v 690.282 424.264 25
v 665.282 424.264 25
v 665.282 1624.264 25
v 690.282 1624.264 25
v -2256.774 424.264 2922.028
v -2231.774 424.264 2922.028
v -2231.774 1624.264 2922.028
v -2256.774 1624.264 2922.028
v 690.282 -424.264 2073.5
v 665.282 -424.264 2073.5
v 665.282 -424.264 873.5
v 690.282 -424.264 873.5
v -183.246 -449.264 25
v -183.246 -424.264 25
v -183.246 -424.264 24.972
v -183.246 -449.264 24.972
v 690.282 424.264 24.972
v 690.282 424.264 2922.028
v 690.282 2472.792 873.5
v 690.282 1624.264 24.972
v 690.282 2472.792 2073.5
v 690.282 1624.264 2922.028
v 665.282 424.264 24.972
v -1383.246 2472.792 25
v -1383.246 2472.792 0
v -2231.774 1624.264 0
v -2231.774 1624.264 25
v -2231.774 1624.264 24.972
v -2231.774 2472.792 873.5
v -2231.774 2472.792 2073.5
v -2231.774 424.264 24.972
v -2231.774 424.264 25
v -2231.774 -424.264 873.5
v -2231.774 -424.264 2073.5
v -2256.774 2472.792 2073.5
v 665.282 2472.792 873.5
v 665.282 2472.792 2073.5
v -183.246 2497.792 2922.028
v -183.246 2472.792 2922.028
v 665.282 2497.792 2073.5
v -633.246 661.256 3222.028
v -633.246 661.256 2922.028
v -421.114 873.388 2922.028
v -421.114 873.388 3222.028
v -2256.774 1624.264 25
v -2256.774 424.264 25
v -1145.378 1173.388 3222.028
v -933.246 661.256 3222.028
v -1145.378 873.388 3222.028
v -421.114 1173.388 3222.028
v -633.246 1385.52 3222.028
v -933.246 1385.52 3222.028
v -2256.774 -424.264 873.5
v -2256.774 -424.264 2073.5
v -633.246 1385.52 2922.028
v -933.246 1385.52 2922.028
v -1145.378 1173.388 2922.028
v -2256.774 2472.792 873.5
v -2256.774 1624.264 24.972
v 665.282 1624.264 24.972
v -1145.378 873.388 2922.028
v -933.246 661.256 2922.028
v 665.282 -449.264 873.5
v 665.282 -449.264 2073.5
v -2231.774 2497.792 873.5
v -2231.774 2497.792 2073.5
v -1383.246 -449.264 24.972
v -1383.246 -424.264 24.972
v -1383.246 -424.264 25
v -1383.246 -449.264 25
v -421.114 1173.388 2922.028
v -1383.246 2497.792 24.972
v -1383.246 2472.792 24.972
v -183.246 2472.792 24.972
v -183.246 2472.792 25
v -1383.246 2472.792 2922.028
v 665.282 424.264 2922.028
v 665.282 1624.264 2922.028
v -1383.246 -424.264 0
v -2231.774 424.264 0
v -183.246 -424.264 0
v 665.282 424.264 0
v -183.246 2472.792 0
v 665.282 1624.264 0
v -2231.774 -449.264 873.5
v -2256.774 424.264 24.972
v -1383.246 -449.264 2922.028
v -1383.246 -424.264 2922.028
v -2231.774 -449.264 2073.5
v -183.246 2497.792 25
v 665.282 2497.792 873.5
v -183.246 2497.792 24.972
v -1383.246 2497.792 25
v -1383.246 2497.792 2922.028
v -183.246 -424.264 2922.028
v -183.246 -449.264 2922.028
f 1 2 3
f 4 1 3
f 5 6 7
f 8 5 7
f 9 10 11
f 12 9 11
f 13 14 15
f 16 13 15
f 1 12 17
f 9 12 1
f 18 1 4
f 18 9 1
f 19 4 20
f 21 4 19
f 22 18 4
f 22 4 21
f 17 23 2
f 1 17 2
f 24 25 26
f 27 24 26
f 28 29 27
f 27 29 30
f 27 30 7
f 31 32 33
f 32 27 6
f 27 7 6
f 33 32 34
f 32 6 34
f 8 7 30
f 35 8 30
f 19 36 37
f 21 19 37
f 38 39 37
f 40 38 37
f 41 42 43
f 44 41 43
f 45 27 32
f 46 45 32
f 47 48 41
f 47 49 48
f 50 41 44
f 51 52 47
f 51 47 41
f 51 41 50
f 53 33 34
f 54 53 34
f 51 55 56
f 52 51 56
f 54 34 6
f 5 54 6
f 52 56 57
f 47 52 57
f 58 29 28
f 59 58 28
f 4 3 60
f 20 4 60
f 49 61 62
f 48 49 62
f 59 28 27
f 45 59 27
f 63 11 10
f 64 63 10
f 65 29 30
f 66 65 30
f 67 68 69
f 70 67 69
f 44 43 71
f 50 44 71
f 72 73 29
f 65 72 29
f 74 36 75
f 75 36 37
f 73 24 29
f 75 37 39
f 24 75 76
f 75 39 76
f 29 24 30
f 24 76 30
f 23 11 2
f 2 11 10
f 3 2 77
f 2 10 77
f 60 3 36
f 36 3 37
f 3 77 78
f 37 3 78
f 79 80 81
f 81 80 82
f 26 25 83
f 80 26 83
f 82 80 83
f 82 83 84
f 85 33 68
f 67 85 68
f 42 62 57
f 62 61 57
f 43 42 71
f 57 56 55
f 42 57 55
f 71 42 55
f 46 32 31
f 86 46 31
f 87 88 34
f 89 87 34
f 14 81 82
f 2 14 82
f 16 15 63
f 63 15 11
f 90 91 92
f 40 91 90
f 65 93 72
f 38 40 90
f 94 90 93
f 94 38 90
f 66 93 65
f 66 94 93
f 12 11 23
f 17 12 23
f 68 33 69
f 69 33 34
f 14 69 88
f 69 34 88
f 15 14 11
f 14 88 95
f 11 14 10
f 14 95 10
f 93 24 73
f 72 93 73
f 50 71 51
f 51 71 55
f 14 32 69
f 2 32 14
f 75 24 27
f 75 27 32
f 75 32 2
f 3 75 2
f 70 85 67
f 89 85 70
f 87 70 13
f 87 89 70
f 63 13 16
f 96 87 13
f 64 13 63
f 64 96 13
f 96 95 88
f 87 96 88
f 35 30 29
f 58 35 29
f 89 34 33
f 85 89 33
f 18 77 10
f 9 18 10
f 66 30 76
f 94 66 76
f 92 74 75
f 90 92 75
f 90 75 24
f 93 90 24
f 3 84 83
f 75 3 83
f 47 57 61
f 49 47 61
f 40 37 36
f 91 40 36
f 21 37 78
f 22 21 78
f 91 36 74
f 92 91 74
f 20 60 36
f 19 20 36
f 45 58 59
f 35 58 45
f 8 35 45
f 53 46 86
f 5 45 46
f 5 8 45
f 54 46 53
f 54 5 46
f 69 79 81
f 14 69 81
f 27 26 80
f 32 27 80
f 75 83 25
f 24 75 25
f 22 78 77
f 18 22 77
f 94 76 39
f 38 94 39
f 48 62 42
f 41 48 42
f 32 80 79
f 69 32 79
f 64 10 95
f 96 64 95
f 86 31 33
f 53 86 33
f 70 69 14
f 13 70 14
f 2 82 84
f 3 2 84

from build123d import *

# Parameters (mm, degrees)
F1_DEPTH  = 25
F3_DEPTH  = 25
F5_DEPTH  = 25
F7_DEPTH  = 25
F9_DEPTH  = 25
F11_DEPTH = 300


with BuildPart() as f1:
    # F0 (on Top) → F1 (new body)
    with BuildSketch(Plane.XY):
        Polygon((-183.246235, -424.264069), (665.281903, 424.264069), (665.281903, 1624.264069), (-183.246235, 2472.792206), (-1383.246235, 2472.792206), (-2231.774372, 1624.264069), (-2231.774372, 424.264069), (-1383.246235, -424.264069), align=None)
    extrude(amount=F1_DEPTH)


with BuildPart() as f3:
    # F2 (on face) → F3 (new body)
    with BuildSketch(Plane.XZ.offset(424.264069)):
        Polygon((-183.246235, 25), (-183.246235, 24.971863), (665.281903, 873.5), (665.281903, 2073.5), (-183.246235, 2922.028137), (-1383.246235, 2922.028137), (-2231.774372, 2073.5), (-2231.774372, 873.5), (-1383.246235, 24.971863), (-1383.246235, 25), align=None)
    extrude(amount=F3_DEPTH)


with BuildPart() as f5:
    # F4 (on face) → F5 (new body)
    with BuildSketch(Plane(origin=(0, 2472.792206, 0), x_dir=(-1, 0, 0), z_dir=(0, 1, 0))):
        Polygon((1383.246235, 24.971863), (2231.774372, 873.5), (2231.774372, 2073.5), (1383.246235, 2922.028137), (183.246235, 2922.028137), (-665.281903, 2073.5), (-665.281903, 873.5), (183.246235, 24.971863), (183.246235, 25), (1383.246235, 25), align=None)
    extrude(amount=F5_DEPTH)


with BuildPart() as f7:
    # F6 (on face) → F7 (new body)
    with BuildSketch(Plane.YZ.offset(665.281903)):
        Polygon((1624.264069, 25), (1624.264069, 24.971863), (2472.792206, 873.5), (2472.792206, 2073.5), (1624.264069, 2922.028137), (424.264069, 2922.028137), (-424.264069, 2073.5), (-424.264069, 873.5), (424.264069, 24.971863), (424.264069, 25), align=None)
    extrude(amount=F7_DEPTH)


with BuildPart() as f9:
    # F8 (on face) → F9 (new body)
    with BuildSketch(Plane(origin=(-2231.774372, 0, 0), x_dir=(0, -1, 0), z_dir=(-1, 0, 0))):
        Polygon((-424.264069, 25), (-424.264069, 24.971863), (424.264069, 873.5), (424.264069, 2073.5), (-424.264069, 2922.028137), (-1624.264069, 2922.028137), (-2472.792206, 2073.5), (-2472.792206, 873.5), (-1624.264069, 24.971863), (-1624.264069, 25), align=None)
    extrude(amount=F9_DEPTH)


with BuildPart() as f11:
    # F10 (on face) → F11 (new body)
    with BuildSketch(Plane.XY.offset(2922.028137)):
        Polygon((-933.246235, 661.255579), (-633.246235, 661.255579), (-421.1142, 873.387613), (-421.1142, 1173.387613), (-633.246235, 1385.519648), (-933.246235, 1385.519648), (-1145.378269, 1173.387613), (-1145.378269, 873.387613), align=None)
    extrude(amount=F11_DEPTH)


solid = Compound([f1.part, f3.part, f5.part, f7.part, f9.part, f11.part])
